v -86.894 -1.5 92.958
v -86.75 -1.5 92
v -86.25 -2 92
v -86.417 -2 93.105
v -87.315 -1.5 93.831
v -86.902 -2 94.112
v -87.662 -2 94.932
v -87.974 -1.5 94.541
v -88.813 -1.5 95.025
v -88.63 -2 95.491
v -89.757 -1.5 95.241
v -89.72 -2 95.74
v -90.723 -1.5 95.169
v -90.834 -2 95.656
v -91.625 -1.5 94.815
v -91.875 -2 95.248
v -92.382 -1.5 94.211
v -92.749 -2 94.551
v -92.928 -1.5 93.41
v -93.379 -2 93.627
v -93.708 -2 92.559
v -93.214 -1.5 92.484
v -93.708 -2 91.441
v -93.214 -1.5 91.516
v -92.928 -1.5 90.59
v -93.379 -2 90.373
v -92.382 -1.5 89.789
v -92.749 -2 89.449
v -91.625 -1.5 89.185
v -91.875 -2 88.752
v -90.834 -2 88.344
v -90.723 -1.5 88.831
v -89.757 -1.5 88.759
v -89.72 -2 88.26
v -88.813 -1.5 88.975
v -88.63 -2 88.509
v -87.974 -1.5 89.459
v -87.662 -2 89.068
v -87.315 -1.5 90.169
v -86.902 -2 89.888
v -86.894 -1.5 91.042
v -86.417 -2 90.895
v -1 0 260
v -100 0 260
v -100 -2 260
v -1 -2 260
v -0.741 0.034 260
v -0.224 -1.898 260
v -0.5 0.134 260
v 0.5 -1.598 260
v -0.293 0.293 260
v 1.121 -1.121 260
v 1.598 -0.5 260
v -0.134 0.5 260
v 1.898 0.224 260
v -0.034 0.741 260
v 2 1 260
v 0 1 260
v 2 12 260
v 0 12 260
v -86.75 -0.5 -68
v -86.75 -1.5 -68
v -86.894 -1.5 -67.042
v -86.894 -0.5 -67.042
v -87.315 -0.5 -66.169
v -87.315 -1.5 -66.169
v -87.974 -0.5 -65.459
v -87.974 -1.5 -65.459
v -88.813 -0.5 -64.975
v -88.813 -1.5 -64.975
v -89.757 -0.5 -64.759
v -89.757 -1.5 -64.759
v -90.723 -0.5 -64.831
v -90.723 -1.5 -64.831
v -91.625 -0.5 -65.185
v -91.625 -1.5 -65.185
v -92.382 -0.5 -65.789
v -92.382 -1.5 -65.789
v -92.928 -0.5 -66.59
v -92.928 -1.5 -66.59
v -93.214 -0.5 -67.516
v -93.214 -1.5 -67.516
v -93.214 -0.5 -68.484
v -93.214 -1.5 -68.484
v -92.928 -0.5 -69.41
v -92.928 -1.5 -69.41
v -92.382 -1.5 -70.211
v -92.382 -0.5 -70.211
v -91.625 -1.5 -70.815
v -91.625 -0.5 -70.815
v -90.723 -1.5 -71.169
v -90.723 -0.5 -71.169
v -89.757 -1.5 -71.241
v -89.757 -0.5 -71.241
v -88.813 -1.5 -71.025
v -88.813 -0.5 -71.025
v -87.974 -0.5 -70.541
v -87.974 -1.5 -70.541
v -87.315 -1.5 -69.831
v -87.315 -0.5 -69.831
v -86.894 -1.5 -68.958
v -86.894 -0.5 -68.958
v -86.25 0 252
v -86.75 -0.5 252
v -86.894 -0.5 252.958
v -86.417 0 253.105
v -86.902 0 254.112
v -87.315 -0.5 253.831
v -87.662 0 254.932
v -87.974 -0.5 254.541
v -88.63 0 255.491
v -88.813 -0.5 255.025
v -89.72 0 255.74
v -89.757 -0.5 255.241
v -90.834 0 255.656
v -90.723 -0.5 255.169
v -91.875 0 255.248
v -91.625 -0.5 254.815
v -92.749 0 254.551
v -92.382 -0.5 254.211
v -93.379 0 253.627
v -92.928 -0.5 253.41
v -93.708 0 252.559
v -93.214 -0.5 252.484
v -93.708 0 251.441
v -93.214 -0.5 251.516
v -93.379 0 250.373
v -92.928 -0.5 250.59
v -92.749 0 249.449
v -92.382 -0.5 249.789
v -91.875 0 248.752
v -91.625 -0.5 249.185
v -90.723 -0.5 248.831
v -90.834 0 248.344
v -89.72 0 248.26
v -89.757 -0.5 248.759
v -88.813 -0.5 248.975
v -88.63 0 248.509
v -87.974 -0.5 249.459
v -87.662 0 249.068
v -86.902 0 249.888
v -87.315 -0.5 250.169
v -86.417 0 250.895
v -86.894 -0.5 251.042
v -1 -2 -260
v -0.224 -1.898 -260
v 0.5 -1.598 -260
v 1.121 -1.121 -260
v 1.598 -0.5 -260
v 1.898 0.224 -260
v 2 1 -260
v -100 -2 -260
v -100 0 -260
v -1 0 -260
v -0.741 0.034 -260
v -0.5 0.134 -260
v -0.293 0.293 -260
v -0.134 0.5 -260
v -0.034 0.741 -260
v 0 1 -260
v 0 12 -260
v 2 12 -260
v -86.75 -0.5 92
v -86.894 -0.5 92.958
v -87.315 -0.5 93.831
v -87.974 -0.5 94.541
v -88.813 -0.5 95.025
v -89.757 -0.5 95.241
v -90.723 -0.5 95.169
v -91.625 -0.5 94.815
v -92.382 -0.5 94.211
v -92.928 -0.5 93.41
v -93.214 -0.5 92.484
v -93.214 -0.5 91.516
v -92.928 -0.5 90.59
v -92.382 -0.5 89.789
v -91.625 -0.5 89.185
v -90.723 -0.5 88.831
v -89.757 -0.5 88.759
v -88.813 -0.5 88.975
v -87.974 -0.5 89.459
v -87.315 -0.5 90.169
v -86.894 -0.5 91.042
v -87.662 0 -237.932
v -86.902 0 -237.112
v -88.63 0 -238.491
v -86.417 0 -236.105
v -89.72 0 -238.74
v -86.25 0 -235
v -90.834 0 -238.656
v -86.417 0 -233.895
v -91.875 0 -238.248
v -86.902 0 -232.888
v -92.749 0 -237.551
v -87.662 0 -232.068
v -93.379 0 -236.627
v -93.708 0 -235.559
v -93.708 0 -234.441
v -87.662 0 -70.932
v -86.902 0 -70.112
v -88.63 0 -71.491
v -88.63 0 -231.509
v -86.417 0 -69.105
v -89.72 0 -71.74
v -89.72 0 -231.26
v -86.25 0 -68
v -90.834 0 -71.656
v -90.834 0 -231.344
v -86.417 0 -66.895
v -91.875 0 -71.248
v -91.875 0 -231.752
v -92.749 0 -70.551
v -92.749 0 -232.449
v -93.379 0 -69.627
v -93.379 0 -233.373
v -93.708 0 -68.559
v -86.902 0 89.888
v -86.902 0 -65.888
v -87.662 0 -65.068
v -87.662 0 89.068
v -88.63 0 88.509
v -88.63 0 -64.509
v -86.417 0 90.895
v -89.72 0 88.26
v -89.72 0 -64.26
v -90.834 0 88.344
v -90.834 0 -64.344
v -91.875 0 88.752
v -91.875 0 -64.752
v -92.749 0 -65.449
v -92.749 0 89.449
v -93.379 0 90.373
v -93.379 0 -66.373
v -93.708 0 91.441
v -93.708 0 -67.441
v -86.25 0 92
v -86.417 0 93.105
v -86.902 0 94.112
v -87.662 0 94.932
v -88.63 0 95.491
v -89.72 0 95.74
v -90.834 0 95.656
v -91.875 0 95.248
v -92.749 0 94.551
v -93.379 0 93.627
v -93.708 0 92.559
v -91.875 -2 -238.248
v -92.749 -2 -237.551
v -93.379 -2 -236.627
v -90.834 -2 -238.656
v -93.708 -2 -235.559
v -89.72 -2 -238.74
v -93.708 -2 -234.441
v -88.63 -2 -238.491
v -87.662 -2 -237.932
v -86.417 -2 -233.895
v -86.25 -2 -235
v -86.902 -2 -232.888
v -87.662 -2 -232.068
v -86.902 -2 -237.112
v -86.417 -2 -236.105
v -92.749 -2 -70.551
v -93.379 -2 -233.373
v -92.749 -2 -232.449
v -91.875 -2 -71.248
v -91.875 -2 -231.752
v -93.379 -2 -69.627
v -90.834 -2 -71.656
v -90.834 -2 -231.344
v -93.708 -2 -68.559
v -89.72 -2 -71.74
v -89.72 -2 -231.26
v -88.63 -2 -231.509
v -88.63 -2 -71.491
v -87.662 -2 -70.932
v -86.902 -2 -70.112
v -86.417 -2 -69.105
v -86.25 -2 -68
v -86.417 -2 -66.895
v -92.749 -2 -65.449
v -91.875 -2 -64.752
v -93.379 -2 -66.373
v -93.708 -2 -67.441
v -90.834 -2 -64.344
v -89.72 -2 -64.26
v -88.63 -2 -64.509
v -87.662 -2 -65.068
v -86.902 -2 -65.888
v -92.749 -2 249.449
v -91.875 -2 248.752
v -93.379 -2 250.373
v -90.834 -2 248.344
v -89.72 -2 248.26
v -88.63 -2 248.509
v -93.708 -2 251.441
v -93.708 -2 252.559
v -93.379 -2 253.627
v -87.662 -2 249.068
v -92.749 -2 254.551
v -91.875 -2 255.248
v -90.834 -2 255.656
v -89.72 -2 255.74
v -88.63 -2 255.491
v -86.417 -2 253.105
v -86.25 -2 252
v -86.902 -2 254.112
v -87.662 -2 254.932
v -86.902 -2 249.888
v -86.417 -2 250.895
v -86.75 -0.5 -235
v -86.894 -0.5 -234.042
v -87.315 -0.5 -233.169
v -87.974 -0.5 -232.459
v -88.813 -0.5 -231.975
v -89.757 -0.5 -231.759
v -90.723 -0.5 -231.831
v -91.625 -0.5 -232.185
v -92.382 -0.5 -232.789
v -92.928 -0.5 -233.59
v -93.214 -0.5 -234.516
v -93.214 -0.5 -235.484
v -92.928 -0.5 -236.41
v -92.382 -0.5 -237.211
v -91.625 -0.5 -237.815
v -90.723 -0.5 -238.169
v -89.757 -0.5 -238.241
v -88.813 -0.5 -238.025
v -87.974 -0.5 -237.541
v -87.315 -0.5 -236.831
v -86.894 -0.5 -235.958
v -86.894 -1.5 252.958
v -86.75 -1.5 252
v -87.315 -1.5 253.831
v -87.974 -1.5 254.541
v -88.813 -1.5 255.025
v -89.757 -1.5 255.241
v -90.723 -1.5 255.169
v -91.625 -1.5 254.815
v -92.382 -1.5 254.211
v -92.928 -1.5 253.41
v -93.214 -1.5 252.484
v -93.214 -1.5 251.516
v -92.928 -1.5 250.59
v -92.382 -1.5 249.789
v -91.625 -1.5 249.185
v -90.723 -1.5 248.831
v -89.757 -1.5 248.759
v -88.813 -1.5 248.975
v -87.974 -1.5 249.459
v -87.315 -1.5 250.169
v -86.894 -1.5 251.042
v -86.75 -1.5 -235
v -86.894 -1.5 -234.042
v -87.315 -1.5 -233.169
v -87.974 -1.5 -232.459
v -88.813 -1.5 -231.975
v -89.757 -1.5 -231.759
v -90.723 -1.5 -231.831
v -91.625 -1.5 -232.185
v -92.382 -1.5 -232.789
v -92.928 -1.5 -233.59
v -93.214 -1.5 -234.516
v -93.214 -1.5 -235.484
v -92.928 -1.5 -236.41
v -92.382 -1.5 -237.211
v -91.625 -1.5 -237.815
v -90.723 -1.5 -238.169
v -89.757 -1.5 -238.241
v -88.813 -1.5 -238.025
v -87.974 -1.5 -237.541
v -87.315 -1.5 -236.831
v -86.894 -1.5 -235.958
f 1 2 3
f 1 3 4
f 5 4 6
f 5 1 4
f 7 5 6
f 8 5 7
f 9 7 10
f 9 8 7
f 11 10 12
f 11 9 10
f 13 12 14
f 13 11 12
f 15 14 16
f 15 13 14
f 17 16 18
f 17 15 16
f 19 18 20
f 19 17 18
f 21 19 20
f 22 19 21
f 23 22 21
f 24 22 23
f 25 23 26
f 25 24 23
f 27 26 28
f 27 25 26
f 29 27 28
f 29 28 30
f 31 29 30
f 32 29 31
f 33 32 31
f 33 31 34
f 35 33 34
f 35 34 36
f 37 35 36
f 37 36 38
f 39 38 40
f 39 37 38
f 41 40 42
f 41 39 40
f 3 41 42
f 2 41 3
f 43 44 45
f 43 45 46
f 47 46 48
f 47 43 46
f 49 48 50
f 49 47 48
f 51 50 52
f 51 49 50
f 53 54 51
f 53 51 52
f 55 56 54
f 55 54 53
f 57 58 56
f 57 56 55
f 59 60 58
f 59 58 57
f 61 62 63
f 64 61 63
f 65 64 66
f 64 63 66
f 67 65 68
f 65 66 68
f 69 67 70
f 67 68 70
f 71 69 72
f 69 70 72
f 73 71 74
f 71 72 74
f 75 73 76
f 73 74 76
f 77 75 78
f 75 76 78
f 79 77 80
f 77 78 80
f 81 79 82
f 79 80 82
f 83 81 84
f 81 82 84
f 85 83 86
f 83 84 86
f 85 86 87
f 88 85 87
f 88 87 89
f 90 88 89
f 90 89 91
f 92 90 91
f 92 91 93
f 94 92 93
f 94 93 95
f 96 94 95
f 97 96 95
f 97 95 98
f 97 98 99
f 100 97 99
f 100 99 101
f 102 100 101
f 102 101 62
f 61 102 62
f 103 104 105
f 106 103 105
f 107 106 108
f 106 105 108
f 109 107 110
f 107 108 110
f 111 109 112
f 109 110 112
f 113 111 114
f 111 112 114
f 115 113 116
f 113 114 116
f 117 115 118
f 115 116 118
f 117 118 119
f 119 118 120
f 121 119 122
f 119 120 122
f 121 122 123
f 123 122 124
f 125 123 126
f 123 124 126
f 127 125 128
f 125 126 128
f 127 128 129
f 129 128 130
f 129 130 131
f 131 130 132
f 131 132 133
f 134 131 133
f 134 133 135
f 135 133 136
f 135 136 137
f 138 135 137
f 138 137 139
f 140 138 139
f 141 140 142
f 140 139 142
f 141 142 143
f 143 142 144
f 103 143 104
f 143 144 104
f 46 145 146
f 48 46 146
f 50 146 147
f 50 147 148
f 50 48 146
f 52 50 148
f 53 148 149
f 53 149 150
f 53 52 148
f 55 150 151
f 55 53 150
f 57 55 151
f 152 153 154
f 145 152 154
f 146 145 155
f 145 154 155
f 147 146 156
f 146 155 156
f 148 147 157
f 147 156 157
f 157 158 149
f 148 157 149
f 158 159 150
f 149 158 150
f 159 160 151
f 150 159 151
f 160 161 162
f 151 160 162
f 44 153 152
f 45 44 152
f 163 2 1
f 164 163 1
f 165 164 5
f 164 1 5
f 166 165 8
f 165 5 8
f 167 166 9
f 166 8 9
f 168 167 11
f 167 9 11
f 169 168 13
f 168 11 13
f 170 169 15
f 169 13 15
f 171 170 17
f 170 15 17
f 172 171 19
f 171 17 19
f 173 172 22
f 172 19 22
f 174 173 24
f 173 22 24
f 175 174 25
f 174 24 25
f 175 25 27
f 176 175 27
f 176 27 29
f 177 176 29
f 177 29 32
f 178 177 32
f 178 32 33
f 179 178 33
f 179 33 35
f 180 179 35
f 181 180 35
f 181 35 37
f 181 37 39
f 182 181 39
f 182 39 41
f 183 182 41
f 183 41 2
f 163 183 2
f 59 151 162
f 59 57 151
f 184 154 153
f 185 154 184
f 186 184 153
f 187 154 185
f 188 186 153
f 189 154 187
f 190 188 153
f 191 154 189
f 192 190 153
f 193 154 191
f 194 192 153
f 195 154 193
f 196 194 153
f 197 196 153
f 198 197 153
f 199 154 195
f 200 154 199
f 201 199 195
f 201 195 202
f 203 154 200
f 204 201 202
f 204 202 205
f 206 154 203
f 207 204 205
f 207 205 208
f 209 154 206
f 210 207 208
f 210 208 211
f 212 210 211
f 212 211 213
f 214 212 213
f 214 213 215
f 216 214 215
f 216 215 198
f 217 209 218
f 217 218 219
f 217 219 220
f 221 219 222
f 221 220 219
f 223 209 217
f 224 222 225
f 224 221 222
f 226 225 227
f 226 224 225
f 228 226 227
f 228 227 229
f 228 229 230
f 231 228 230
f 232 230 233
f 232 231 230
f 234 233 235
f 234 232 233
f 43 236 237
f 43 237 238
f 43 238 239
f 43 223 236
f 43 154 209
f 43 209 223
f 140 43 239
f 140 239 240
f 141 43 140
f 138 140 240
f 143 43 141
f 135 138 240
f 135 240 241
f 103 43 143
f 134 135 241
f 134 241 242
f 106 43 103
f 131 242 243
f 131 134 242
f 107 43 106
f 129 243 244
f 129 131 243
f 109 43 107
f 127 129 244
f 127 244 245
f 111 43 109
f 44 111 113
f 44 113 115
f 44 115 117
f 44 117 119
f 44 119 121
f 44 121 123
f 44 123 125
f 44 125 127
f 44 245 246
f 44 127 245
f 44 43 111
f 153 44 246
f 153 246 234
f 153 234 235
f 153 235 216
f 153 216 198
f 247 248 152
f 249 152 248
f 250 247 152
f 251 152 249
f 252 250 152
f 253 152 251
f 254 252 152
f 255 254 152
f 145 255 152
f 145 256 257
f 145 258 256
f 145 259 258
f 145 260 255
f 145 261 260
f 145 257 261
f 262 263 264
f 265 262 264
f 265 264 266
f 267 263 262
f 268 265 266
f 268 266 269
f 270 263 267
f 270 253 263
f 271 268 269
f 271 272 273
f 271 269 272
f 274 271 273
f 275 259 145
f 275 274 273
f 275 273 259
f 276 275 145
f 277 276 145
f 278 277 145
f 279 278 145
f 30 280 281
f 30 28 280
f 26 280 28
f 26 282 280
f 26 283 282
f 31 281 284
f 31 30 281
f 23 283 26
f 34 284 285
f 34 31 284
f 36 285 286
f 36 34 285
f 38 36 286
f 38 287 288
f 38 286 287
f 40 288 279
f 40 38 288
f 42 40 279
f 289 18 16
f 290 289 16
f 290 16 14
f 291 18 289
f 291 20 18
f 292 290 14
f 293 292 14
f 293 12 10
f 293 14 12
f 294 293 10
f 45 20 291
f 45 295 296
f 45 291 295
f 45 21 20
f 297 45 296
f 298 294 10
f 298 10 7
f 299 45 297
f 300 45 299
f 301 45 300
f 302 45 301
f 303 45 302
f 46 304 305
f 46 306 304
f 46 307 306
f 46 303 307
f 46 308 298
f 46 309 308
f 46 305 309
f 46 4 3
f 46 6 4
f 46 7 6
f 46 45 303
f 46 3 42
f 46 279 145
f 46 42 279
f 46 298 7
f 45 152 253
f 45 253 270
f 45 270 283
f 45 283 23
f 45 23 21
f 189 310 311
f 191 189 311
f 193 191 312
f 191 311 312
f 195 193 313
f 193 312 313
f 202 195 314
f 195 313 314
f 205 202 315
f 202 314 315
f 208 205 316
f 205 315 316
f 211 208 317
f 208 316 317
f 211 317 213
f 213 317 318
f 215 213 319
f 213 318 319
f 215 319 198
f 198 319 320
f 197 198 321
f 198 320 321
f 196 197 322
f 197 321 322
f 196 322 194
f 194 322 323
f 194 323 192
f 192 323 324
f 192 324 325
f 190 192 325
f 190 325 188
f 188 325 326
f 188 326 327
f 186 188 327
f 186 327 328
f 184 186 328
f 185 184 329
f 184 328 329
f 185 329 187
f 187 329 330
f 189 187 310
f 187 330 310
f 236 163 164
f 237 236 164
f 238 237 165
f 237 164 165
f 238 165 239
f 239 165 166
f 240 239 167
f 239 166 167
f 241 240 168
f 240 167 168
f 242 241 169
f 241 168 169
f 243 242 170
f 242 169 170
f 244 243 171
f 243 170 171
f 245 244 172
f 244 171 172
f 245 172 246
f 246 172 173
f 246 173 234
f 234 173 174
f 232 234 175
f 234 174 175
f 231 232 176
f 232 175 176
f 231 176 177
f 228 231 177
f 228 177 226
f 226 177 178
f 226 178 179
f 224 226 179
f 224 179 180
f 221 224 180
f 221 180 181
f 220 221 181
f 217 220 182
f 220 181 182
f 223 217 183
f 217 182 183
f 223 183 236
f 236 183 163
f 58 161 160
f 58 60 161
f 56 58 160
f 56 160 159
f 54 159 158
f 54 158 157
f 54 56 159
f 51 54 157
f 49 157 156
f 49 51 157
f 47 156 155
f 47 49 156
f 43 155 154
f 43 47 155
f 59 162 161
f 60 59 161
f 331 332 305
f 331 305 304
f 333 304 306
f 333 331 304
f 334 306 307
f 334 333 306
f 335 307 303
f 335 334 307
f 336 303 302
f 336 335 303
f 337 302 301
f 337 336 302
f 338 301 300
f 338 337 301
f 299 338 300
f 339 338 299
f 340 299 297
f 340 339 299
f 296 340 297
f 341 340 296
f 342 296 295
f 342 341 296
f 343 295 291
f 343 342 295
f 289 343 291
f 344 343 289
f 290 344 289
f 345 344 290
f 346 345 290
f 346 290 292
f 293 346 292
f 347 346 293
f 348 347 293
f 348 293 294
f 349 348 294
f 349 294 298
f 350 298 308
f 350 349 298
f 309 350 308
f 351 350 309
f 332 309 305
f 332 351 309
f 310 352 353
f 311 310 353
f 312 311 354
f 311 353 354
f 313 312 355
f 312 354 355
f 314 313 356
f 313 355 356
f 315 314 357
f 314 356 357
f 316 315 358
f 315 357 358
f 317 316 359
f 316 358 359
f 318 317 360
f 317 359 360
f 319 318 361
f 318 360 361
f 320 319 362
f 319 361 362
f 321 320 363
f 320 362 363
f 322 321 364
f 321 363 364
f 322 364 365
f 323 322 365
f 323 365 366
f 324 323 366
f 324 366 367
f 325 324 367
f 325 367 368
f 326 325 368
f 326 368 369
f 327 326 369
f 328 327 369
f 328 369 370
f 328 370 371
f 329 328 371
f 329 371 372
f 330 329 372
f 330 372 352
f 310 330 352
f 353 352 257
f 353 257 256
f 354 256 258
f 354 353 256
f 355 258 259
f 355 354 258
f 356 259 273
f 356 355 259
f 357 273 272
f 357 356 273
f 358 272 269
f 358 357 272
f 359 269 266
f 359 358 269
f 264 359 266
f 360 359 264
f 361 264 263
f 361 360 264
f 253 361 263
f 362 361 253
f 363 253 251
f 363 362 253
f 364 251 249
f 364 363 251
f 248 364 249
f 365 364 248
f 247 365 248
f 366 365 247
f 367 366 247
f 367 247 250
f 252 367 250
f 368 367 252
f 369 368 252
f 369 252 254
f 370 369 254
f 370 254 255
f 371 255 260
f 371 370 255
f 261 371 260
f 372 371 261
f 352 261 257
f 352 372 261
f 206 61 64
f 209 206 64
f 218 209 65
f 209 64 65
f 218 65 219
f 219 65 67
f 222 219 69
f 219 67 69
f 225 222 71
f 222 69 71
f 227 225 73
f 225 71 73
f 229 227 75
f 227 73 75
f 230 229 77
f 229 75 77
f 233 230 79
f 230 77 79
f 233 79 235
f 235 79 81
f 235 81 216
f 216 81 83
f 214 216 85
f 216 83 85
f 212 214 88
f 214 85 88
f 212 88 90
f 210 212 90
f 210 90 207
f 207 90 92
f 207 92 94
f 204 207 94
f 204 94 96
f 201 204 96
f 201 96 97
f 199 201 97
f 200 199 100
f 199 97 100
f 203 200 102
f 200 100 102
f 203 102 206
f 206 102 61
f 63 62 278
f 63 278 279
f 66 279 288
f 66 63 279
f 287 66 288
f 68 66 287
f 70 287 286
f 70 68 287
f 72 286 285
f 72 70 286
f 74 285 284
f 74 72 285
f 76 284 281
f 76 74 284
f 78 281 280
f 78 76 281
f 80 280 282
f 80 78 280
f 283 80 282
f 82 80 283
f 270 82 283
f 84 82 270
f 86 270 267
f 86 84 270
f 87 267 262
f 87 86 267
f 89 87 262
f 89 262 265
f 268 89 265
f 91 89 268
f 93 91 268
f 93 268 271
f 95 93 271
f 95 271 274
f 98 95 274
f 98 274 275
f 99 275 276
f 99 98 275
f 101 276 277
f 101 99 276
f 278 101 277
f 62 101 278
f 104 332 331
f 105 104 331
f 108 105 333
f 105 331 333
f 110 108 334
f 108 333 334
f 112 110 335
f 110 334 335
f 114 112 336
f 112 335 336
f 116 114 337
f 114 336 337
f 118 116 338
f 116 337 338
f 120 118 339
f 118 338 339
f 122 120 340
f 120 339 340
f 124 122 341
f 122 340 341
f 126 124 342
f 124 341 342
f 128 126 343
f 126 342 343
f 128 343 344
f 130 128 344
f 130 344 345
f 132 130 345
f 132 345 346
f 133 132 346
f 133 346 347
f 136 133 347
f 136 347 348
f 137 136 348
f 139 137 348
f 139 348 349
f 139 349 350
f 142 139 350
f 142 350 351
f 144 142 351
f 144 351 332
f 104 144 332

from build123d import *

# Parameters (mm, degrees)
F1_DEPTH = 260
F2_R     = 3.25
F3_DEPTH = 25
F4_SIZE  = 0.5


with BuildPart() as f1:
    # F0 (on Top) → F1 (new body, symmetric)
    with BuildSketch(Plane.XY):
        with BuildLine():
            Line((0, 12), (0, 1))
            ThreePointArc((0, 1), (-0.2928932188, 0.2928932188), (-1, 0))
            Line((-1, 0), (-100, 0))
            Line((-100, 0), (-100, -2))
            Line((-100, -2), (-1, -2))
            ThreePointArc((-1, -2), (1.1213203436, -1.1213203436), (2, 1))
            Line((2, 1), (2, 12))
            Line((2, 12), (0, 12))
        make_face()
    extrude(amount=F1_DEPTH, both=True)

    # F2 (on face) → F3 (cut)
    with BuildSketch(Plane.XZ.offset(2)):
        with Locations((-90, 252)):
            Circle(F2_R)
        with Locations((-90, -235)):
            Circle(F2_R)
        with Locations((-90, 92)):
            Circle(F2_R)
        with Locations((-90, -68)):
            Circle(F2_R)
    extrude(amount=-F3_DEPTH, mode=Mode.SUBTRACT)

    # F4
    f4_edges = [f1.edges().sort_by_distance(p)[0] for p in [
        (-93.25, -2, 252),
        (-86.75, -1, 252),
        (-93.25, 0, 252),
        (-93.25, -2, 92),
        (-86.75, -1, 92),
        (-93.25, 0, 92),
        (-93.25, -2, -68),
        (-86.75, -1, -68),
        (-93.25, 0, -68),
        (-93.25, -2, -235),
        (-86.75, -1, -235),
        (-93.25, 0, -235),
    ]]
    chamfer(f4_edges, length=F4_SIZE)


solid = f1.part
